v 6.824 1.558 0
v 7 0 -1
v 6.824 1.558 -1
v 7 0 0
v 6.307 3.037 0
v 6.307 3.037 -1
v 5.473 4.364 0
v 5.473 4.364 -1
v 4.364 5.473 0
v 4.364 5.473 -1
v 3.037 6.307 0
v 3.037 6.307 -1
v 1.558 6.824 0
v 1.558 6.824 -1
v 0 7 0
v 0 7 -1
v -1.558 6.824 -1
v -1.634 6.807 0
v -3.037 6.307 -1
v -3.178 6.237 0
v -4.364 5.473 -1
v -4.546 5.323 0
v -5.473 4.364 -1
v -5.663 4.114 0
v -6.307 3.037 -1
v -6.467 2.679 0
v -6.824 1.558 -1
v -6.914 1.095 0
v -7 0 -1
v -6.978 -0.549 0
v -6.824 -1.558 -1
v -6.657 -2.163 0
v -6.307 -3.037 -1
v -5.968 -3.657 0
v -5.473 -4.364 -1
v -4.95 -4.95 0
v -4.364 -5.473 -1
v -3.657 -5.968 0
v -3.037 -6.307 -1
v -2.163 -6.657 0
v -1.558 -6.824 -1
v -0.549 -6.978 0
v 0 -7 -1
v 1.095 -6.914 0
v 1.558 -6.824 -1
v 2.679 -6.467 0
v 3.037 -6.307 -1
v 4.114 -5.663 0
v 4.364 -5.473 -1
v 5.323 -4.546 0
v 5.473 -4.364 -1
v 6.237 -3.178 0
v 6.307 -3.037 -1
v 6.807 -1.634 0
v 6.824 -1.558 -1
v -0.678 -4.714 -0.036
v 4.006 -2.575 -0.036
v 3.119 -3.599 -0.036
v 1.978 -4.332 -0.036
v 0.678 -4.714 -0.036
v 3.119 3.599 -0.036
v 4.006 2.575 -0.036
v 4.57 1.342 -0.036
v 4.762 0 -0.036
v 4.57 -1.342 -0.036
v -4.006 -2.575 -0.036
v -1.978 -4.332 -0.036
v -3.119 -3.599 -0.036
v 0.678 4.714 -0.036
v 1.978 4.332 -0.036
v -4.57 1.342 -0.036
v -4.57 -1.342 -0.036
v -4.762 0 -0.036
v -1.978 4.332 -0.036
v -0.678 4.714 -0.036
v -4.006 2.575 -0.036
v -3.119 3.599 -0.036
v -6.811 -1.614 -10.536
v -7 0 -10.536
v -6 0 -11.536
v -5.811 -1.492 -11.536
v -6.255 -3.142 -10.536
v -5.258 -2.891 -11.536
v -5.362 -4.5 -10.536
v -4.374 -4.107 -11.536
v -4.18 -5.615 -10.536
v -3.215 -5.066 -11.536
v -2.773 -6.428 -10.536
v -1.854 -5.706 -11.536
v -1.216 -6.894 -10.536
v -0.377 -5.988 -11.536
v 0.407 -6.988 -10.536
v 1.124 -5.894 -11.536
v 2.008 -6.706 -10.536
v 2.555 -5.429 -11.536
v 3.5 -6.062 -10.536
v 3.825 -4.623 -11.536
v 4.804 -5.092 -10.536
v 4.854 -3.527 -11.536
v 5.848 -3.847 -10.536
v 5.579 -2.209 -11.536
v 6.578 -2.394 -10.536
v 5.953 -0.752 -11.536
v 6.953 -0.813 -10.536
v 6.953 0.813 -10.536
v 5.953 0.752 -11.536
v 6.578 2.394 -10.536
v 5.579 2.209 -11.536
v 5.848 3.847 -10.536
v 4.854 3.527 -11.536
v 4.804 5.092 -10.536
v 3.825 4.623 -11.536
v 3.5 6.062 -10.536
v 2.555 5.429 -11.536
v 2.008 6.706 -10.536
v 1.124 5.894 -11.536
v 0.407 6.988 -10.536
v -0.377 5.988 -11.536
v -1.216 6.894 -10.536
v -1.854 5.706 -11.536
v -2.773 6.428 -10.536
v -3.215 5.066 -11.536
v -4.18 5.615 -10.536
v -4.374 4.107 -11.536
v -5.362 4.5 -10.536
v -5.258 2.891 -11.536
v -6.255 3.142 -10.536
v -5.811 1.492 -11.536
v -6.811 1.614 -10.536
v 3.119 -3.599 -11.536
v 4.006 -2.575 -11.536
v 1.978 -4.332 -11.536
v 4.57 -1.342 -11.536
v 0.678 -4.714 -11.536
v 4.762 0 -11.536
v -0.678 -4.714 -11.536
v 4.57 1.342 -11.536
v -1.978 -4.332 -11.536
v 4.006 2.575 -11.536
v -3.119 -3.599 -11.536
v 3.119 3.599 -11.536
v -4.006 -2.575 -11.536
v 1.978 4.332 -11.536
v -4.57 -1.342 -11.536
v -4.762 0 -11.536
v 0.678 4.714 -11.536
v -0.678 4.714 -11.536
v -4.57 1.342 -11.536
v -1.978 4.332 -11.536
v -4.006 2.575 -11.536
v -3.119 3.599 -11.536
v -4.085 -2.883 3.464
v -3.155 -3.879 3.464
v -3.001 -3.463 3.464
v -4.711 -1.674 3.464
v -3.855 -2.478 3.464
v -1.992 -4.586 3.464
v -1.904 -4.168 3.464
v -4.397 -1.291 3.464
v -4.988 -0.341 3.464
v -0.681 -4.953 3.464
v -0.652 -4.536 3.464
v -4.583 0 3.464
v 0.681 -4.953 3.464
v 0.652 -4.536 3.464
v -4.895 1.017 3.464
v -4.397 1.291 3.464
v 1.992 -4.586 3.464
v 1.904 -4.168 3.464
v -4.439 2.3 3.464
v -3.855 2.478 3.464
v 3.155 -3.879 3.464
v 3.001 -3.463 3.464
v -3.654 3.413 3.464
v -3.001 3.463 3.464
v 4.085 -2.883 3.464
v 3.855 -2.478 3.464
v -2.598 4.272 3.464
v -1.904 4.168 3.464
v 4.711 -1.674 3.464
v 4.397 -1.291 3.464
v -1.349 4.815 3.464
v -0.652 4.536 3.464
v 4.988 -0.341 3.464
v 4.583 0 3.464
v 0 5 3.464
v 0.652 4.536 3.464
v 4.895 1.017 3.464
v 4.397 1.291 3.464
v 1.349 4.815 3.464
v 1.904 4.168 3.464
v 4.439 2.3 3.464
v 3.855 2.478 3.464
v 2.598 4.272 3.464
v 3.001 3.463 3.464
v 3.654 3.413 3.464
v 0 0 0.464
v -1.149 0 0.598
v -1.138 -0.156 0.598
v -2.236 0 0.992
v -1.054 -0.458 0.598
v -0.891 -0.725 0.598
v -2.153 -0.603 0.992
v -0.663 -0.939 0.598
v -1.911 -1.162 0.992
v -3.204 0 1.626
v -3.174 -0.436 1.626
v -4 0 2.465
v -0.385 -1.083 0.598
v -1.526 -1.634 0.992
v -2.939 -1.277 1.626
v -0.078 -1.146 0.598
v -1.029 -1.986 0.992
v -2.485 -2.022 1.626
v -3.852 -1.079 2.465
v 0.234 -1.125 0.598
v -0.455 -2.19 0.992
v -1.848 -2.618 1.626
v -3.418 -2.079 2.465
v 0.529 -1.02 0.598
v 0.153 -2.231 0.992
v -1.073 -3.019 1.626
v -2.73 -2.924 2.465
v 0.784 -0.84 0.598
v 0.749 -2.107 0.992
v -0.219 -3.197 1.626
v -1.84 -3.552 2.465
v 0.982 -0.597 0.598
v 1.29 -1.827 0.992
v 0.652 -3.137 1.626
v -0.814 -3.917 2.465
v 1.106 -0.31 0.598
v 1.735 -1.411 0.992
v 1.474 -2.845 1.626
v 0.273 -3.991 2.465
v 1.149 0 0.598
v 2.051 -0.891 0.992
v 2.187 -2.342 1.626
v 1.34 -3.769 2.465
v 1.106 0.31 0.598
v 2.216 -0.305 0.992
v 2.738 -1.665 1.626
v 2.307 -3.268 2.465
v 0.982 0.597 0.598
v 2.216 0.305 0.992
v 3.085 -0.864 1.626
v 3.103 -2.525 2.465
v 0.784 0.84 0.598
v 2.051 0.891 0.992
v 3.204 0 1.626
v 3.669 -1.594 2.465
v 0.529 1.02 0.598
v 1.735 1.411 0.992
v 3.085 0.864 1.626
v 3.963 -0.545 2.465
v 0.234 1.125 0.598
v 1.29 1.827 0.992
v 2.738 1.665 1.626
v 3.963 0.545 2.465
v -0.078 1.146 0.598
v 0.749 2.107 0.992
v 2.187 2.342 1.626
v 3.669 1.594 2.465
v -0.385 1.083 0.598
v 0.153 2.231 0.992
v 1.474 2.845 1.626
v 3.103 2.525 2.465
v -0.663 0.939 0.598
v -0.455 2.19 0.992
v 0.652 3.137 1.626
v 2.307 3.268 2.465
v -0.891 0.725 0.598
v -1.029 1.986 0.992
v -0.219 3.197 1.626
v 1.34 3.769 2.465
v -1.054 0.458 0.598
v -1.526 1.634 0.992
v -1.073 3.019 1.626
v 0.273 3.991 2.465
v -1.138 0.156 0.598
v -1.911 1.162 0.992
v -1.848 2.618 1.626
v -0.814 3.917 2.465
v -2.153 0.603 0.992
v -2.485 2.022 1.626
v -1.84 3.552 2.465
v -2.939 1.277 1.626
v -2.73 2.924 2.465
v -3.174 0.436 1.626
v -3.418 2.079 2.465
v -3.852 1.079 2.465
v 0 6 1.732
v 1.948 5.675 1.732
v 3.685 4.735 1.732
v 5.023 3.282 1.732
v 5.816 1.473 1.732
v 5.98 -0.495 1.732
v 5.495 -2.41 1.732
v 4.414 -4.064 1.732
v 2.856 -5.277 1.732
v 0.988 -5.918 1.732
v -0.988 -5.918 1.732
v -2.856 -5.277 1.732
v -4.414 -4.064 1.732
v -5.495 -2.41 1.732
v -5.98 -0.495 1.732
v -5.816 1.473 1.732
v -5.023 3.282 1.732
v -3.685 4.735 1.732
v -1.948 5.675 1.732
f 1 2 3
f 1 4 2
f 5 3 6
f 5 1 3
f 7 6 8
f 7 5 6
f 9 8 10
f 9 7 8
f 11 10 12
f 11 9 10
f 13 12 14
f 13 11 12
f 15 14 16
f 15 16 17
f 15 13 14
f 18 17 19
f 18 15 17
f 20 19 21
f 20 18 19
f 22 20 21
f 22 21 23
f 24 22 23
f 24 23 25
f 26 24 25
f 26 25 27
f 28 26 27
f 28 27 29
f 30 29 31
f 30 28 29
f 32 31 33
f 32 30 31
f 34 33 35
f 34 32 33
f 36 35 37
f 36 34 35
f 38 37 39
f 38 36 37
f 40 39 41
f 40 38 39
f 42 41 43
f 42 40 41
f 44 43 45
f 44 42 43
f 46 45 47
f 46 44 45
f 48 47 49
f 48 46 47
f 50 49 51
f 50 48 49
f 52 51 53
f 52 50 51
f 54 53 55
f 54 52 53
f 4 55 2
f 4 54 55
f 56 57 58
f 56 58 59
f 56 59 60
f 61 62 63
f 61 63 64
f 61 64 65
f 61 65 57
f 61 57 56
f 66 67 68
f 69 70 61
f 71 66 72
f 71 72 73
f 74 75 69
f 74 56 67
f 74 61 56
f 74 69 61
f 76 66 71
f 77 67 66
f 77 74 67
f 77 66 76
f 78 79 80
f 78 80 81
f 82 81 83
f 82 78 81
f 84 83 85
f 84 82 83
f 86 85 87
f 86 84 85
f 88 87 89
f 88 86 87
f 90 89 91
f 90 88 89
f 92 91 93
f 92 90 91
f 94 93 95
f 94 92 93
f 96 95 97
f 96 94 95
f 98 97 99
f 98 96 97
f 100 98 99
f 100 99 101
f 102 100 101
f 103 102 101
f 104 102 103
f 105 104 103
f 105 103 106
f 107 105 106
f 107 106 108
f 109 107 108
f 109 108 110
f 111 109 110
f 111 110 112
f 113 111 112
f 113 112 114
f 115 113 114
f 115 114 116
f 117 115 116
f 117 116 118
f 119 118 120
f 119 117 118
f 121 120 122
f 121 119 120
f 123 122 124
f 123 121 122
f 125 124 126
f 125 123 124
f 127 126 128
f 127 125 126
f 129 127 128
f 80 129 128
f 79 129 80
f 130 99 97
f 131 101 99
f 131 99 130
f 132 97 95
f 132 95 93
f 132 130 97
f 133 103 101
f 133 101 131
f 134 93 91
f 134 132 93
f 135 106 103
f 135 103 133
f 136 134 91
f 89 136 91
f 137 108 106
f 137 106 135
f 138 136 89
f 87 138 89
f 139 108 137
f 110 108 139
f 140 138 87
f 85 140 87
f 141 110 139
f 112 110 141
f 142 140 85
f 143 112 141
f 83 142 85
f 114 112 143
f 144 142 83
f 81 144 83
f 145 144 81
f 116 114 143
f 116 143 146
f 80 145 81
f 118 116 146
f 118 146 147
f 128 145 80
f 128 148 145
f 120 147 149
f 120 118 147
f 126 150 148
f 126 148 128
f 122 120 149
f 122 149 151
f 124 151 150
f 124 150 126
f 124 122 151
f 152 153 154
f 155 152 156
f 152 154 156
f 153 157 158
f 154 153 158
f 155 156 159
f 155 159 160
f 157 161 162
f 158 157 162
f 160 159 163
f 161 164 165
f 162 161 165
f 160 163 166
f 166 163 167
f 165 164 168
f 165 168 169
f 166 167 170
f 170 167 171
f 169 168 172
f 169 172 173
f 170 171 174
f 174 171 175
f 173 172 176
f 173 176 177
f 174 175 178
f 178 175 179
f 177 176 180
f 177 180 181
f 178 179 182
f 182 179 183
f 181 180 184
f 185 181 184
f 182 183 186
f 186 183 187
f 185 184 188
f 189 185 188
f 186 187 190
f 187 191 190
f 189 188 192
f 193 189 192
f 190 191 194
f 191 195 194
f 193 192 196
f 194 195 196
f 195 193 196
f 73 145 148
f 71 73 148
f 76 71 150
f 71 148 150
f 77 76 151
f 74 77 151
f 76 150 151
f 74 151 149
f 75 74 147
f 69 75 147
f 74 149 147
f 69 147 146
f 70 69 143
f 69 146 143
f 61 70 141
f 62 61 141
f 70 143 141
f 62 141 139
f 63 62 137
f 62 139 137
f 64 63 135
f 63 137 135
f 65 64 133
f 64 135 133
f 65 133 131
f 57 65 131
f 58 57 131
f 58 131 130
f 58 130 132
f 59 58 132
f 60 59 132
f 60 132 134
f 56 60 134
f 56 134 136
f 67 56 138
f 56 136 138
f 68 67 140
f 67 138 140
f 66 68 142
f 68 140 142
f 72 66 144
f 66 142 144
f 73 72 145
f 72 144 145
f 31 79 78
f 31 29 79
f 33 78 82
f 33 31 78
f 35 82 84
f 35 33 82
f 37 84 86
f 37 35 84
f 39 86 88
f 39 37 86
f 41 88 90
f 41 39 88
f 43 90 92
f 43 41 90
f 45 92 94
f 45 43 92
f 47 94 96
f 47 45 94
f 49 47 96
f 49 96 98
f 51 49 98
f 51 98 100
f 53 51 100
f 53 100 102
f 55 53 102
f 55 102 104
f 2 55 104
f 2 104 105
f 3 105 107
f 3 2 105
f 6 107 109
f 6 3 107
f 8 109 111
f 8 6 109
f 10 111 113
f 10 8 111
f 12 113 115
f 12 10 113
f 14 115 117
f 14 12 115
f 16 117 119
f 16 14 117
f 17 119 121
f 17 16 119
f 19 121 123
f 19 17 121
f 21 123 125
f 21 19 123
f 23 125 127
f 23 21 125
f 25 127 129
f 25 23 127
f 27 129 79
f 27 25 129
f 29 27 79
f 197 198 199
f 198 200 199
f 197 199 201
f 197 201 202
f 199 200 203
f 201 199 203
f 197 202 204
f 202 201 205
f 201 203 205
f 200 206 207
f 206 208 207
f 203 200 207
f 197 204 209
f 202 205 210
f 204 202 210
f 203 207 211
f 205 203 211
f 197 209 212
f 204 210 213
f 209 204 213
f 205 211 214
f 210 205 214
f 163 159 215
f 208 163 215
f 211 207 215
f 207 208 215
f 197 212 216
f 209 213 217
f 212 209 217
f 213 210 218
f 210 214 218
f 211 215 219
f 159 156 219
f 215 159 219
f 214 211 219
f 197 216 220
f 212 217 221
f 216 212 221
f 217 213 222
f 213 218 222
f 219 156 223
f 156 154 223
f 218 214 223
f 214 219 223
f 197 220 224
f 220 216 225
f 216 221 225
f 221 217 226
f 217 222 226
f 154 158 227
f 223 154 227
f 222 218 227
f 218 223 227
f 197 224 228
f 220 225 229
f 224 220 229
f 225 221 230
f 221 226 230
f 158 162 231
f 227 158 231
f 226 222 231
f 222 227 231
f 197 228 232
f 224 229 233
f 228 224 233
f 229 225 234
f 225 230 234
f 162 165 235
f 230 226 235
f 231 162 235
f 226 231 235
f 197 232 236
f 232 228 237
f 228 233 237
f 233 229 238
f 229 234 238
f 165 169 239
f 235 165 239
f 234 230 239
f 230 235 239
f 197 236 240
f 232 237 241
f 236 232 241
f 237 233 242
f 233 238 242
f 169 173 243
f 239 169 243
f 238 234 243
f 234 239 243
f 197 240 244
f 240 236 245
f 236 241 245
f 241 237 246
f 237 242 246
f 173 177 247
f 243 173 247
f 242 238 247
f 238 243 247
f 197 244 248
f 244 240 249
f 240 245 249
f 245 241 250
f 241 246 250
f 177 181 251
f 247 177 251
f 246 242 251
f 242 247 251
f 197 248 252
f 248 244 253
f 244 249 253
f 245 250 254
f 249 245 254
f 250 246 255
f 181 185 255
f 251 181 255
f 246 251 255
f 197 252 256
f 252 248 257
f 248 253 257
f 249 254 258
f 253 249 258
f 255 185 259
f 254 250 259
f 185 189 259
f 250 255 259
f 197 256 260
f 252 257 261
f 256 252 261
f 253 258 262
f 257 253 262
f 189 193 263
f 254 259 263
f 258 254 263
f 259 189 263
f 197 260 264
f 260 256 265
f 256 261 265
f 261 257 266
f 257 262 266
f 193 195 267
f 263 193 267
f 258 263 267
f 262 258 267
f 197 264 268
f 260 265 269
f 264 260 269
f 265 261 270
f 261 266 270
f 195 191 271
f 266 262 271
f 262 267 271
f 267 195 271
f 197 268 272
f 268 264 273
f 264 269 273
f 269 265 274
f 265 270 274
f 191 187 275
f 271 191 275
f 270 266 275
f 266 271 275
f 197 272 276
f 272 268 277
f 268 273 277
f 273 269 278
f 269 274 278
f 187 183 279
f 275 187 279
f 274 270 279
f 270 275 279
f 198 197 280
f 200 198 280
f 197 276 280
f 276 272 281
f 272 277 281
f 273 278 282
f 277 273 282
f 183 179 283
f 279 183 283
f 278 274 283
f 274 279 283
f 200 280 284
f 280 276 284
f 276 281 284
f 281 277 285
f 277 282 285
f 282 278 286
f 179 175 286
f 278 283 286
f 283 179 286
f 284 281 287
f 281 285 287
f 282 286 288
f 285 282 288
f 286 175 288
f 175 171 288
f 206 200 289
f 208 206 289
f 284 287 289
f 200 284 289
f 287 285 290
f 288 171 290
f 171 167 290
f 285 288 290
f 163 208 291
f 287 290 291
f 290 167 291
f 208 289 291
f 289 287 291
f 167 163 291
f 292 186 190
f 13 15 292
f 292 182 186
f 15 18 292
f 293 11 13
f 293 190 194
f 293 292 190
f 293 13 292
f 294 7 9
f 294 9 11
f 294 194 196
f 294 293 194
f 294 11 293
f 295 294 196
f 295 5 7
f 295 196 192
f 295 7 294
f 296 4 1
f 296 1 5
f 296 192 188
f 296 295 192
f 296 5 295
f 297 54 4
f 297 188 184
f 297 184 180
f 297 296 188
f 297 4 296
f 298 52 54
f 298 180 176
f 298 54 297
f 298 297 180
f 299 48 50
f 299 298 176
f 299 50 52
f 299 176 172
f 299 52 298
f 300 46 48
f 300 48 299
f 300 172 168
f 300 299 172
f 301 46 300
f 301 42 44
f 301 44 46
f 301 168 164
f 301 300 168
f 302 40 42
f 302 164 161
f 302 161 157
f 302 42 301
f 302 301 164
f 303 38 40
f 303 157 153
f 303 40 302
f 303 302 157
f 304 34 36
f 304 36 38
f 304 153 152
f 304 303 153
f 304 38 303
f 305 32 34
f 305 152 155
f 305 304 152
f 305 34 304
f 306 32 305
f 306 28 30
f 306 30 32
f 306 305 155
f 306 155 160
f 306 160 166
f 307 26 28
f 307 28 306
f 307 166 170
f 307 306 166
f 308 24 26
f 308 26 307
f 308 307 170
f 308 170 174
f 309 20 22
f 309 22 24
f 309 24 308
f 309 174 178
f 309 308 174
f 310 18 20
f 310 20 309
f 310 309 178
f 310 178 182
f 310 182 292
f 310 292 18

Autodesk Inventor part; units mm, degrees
ref_plane "YZ Plane" through (0, 0, 0) normal (1, 0, 0) x (0, 1, 0)
ref_plane "XZ Plane" through (0, 0, 0) normal (0, 1, 0) x (-1, 0, 0)
ref_plane "XY Plane" through (0, 0, 0) normal (0, 0, 1) x (1, 0, 0)
sketch "RingSketch" plane through (0, 0, 0) normal (0, 0, 1) x (1, 0, 0)
  circle A0 centre (0, 0) radius 7
  dimension "RingDia" = 14
extrude "Ring" add sketch "RingSketch" against normal blind 1
sketch "ShankSketch" plane through (0, 0, -1) normal (0, 0, -1) x (-1, 0, 0)
  circle A0 centre (0, 0) radius 7
  dimension "ShankDia" = 14
extrude "Shank" add sketch "ShankSketch" along normal blind 10.536
sketch "ConeSketch" plane through (0, 0, 0) normal (1, 0, 0) x (0, 1, 0)
  line L0 (0, 0) -> (7, 0)
  line L1 (7, 0) -> (5, 3.4641)
  line L2 (5, 3.4641) -> (0, 3.4641)
  line L3 (0, 3.4641) -> (0, 0)
  line L4 (-7, 0) -> (7, 0) projected
  dimension "ConeAngle" = 60
  dimension "ConeBase" = 7
  dimension "ConeTipDia" = 5
revolve "Cone" add sketch "ConeSketch" angle 360 about axis through (0, 0, 3.4641) along (0, 0, -1)
sketch "SocketSketch" plane through (0, 0, 0) normal (0, 1, 0) x (-1, 0, 0)
  arc A0 (0, 0.4641) -> (0, 10.4641) centre (0, 5.4641) ccw
  line L0 (0, 10.4641) -> (0, 0.4641)
  line L1 (-5, 3.4641) -> (5, 3.4641) projected
  line L2 (5, 3.4641) -> (7, 0) projected
  point P0 (0, 0)
  dimension "RecessDia" = 10
  dimension "BallOffset" = 2
revolve "Socket" cut sketch "SocketSketch" angle 360 about axis through (0, 0, 10.4641) along (0, 0, -1)
sketch "MagnetHoleSketch" plane through (0, 0, -11.536) normal (0, 0, -1) x (-1, 0, 0)
  circle A0 centre (0, 0) radius 4.7625
  dimension "MagnetHoleDia" = 9.525
extrude "MagnetHole" cut sketch "MagnetHoleSketch" against normal blind 11.5001
sketch "PartLength" plane through (0, 0, 0) normal (0, 1, 0) x (-1, 0, 0)
  line L0 (-5, 3.4641) -> (5, 3.4641) projected
  line L1 (-7, -11.536) -> (7, -11.536) projected
  point P0 (0, 0)
  dimension "PartLen" = 15.0001
chamfer "Chamfer1" distance 1 angle 45 1 edges at (7, 0, -11.536)
equation "\"ShankDia\" = RingDia"
equation "\"ConeBase\" = 0.5 * RingDia"
equation "\"ConeTipDia\" = 0.5 * BallDia"
equation "\"RecessDia\" = BallDia"
equation "\"BallDia\" = 10"
properties part number "Rod End 9.5mm"
